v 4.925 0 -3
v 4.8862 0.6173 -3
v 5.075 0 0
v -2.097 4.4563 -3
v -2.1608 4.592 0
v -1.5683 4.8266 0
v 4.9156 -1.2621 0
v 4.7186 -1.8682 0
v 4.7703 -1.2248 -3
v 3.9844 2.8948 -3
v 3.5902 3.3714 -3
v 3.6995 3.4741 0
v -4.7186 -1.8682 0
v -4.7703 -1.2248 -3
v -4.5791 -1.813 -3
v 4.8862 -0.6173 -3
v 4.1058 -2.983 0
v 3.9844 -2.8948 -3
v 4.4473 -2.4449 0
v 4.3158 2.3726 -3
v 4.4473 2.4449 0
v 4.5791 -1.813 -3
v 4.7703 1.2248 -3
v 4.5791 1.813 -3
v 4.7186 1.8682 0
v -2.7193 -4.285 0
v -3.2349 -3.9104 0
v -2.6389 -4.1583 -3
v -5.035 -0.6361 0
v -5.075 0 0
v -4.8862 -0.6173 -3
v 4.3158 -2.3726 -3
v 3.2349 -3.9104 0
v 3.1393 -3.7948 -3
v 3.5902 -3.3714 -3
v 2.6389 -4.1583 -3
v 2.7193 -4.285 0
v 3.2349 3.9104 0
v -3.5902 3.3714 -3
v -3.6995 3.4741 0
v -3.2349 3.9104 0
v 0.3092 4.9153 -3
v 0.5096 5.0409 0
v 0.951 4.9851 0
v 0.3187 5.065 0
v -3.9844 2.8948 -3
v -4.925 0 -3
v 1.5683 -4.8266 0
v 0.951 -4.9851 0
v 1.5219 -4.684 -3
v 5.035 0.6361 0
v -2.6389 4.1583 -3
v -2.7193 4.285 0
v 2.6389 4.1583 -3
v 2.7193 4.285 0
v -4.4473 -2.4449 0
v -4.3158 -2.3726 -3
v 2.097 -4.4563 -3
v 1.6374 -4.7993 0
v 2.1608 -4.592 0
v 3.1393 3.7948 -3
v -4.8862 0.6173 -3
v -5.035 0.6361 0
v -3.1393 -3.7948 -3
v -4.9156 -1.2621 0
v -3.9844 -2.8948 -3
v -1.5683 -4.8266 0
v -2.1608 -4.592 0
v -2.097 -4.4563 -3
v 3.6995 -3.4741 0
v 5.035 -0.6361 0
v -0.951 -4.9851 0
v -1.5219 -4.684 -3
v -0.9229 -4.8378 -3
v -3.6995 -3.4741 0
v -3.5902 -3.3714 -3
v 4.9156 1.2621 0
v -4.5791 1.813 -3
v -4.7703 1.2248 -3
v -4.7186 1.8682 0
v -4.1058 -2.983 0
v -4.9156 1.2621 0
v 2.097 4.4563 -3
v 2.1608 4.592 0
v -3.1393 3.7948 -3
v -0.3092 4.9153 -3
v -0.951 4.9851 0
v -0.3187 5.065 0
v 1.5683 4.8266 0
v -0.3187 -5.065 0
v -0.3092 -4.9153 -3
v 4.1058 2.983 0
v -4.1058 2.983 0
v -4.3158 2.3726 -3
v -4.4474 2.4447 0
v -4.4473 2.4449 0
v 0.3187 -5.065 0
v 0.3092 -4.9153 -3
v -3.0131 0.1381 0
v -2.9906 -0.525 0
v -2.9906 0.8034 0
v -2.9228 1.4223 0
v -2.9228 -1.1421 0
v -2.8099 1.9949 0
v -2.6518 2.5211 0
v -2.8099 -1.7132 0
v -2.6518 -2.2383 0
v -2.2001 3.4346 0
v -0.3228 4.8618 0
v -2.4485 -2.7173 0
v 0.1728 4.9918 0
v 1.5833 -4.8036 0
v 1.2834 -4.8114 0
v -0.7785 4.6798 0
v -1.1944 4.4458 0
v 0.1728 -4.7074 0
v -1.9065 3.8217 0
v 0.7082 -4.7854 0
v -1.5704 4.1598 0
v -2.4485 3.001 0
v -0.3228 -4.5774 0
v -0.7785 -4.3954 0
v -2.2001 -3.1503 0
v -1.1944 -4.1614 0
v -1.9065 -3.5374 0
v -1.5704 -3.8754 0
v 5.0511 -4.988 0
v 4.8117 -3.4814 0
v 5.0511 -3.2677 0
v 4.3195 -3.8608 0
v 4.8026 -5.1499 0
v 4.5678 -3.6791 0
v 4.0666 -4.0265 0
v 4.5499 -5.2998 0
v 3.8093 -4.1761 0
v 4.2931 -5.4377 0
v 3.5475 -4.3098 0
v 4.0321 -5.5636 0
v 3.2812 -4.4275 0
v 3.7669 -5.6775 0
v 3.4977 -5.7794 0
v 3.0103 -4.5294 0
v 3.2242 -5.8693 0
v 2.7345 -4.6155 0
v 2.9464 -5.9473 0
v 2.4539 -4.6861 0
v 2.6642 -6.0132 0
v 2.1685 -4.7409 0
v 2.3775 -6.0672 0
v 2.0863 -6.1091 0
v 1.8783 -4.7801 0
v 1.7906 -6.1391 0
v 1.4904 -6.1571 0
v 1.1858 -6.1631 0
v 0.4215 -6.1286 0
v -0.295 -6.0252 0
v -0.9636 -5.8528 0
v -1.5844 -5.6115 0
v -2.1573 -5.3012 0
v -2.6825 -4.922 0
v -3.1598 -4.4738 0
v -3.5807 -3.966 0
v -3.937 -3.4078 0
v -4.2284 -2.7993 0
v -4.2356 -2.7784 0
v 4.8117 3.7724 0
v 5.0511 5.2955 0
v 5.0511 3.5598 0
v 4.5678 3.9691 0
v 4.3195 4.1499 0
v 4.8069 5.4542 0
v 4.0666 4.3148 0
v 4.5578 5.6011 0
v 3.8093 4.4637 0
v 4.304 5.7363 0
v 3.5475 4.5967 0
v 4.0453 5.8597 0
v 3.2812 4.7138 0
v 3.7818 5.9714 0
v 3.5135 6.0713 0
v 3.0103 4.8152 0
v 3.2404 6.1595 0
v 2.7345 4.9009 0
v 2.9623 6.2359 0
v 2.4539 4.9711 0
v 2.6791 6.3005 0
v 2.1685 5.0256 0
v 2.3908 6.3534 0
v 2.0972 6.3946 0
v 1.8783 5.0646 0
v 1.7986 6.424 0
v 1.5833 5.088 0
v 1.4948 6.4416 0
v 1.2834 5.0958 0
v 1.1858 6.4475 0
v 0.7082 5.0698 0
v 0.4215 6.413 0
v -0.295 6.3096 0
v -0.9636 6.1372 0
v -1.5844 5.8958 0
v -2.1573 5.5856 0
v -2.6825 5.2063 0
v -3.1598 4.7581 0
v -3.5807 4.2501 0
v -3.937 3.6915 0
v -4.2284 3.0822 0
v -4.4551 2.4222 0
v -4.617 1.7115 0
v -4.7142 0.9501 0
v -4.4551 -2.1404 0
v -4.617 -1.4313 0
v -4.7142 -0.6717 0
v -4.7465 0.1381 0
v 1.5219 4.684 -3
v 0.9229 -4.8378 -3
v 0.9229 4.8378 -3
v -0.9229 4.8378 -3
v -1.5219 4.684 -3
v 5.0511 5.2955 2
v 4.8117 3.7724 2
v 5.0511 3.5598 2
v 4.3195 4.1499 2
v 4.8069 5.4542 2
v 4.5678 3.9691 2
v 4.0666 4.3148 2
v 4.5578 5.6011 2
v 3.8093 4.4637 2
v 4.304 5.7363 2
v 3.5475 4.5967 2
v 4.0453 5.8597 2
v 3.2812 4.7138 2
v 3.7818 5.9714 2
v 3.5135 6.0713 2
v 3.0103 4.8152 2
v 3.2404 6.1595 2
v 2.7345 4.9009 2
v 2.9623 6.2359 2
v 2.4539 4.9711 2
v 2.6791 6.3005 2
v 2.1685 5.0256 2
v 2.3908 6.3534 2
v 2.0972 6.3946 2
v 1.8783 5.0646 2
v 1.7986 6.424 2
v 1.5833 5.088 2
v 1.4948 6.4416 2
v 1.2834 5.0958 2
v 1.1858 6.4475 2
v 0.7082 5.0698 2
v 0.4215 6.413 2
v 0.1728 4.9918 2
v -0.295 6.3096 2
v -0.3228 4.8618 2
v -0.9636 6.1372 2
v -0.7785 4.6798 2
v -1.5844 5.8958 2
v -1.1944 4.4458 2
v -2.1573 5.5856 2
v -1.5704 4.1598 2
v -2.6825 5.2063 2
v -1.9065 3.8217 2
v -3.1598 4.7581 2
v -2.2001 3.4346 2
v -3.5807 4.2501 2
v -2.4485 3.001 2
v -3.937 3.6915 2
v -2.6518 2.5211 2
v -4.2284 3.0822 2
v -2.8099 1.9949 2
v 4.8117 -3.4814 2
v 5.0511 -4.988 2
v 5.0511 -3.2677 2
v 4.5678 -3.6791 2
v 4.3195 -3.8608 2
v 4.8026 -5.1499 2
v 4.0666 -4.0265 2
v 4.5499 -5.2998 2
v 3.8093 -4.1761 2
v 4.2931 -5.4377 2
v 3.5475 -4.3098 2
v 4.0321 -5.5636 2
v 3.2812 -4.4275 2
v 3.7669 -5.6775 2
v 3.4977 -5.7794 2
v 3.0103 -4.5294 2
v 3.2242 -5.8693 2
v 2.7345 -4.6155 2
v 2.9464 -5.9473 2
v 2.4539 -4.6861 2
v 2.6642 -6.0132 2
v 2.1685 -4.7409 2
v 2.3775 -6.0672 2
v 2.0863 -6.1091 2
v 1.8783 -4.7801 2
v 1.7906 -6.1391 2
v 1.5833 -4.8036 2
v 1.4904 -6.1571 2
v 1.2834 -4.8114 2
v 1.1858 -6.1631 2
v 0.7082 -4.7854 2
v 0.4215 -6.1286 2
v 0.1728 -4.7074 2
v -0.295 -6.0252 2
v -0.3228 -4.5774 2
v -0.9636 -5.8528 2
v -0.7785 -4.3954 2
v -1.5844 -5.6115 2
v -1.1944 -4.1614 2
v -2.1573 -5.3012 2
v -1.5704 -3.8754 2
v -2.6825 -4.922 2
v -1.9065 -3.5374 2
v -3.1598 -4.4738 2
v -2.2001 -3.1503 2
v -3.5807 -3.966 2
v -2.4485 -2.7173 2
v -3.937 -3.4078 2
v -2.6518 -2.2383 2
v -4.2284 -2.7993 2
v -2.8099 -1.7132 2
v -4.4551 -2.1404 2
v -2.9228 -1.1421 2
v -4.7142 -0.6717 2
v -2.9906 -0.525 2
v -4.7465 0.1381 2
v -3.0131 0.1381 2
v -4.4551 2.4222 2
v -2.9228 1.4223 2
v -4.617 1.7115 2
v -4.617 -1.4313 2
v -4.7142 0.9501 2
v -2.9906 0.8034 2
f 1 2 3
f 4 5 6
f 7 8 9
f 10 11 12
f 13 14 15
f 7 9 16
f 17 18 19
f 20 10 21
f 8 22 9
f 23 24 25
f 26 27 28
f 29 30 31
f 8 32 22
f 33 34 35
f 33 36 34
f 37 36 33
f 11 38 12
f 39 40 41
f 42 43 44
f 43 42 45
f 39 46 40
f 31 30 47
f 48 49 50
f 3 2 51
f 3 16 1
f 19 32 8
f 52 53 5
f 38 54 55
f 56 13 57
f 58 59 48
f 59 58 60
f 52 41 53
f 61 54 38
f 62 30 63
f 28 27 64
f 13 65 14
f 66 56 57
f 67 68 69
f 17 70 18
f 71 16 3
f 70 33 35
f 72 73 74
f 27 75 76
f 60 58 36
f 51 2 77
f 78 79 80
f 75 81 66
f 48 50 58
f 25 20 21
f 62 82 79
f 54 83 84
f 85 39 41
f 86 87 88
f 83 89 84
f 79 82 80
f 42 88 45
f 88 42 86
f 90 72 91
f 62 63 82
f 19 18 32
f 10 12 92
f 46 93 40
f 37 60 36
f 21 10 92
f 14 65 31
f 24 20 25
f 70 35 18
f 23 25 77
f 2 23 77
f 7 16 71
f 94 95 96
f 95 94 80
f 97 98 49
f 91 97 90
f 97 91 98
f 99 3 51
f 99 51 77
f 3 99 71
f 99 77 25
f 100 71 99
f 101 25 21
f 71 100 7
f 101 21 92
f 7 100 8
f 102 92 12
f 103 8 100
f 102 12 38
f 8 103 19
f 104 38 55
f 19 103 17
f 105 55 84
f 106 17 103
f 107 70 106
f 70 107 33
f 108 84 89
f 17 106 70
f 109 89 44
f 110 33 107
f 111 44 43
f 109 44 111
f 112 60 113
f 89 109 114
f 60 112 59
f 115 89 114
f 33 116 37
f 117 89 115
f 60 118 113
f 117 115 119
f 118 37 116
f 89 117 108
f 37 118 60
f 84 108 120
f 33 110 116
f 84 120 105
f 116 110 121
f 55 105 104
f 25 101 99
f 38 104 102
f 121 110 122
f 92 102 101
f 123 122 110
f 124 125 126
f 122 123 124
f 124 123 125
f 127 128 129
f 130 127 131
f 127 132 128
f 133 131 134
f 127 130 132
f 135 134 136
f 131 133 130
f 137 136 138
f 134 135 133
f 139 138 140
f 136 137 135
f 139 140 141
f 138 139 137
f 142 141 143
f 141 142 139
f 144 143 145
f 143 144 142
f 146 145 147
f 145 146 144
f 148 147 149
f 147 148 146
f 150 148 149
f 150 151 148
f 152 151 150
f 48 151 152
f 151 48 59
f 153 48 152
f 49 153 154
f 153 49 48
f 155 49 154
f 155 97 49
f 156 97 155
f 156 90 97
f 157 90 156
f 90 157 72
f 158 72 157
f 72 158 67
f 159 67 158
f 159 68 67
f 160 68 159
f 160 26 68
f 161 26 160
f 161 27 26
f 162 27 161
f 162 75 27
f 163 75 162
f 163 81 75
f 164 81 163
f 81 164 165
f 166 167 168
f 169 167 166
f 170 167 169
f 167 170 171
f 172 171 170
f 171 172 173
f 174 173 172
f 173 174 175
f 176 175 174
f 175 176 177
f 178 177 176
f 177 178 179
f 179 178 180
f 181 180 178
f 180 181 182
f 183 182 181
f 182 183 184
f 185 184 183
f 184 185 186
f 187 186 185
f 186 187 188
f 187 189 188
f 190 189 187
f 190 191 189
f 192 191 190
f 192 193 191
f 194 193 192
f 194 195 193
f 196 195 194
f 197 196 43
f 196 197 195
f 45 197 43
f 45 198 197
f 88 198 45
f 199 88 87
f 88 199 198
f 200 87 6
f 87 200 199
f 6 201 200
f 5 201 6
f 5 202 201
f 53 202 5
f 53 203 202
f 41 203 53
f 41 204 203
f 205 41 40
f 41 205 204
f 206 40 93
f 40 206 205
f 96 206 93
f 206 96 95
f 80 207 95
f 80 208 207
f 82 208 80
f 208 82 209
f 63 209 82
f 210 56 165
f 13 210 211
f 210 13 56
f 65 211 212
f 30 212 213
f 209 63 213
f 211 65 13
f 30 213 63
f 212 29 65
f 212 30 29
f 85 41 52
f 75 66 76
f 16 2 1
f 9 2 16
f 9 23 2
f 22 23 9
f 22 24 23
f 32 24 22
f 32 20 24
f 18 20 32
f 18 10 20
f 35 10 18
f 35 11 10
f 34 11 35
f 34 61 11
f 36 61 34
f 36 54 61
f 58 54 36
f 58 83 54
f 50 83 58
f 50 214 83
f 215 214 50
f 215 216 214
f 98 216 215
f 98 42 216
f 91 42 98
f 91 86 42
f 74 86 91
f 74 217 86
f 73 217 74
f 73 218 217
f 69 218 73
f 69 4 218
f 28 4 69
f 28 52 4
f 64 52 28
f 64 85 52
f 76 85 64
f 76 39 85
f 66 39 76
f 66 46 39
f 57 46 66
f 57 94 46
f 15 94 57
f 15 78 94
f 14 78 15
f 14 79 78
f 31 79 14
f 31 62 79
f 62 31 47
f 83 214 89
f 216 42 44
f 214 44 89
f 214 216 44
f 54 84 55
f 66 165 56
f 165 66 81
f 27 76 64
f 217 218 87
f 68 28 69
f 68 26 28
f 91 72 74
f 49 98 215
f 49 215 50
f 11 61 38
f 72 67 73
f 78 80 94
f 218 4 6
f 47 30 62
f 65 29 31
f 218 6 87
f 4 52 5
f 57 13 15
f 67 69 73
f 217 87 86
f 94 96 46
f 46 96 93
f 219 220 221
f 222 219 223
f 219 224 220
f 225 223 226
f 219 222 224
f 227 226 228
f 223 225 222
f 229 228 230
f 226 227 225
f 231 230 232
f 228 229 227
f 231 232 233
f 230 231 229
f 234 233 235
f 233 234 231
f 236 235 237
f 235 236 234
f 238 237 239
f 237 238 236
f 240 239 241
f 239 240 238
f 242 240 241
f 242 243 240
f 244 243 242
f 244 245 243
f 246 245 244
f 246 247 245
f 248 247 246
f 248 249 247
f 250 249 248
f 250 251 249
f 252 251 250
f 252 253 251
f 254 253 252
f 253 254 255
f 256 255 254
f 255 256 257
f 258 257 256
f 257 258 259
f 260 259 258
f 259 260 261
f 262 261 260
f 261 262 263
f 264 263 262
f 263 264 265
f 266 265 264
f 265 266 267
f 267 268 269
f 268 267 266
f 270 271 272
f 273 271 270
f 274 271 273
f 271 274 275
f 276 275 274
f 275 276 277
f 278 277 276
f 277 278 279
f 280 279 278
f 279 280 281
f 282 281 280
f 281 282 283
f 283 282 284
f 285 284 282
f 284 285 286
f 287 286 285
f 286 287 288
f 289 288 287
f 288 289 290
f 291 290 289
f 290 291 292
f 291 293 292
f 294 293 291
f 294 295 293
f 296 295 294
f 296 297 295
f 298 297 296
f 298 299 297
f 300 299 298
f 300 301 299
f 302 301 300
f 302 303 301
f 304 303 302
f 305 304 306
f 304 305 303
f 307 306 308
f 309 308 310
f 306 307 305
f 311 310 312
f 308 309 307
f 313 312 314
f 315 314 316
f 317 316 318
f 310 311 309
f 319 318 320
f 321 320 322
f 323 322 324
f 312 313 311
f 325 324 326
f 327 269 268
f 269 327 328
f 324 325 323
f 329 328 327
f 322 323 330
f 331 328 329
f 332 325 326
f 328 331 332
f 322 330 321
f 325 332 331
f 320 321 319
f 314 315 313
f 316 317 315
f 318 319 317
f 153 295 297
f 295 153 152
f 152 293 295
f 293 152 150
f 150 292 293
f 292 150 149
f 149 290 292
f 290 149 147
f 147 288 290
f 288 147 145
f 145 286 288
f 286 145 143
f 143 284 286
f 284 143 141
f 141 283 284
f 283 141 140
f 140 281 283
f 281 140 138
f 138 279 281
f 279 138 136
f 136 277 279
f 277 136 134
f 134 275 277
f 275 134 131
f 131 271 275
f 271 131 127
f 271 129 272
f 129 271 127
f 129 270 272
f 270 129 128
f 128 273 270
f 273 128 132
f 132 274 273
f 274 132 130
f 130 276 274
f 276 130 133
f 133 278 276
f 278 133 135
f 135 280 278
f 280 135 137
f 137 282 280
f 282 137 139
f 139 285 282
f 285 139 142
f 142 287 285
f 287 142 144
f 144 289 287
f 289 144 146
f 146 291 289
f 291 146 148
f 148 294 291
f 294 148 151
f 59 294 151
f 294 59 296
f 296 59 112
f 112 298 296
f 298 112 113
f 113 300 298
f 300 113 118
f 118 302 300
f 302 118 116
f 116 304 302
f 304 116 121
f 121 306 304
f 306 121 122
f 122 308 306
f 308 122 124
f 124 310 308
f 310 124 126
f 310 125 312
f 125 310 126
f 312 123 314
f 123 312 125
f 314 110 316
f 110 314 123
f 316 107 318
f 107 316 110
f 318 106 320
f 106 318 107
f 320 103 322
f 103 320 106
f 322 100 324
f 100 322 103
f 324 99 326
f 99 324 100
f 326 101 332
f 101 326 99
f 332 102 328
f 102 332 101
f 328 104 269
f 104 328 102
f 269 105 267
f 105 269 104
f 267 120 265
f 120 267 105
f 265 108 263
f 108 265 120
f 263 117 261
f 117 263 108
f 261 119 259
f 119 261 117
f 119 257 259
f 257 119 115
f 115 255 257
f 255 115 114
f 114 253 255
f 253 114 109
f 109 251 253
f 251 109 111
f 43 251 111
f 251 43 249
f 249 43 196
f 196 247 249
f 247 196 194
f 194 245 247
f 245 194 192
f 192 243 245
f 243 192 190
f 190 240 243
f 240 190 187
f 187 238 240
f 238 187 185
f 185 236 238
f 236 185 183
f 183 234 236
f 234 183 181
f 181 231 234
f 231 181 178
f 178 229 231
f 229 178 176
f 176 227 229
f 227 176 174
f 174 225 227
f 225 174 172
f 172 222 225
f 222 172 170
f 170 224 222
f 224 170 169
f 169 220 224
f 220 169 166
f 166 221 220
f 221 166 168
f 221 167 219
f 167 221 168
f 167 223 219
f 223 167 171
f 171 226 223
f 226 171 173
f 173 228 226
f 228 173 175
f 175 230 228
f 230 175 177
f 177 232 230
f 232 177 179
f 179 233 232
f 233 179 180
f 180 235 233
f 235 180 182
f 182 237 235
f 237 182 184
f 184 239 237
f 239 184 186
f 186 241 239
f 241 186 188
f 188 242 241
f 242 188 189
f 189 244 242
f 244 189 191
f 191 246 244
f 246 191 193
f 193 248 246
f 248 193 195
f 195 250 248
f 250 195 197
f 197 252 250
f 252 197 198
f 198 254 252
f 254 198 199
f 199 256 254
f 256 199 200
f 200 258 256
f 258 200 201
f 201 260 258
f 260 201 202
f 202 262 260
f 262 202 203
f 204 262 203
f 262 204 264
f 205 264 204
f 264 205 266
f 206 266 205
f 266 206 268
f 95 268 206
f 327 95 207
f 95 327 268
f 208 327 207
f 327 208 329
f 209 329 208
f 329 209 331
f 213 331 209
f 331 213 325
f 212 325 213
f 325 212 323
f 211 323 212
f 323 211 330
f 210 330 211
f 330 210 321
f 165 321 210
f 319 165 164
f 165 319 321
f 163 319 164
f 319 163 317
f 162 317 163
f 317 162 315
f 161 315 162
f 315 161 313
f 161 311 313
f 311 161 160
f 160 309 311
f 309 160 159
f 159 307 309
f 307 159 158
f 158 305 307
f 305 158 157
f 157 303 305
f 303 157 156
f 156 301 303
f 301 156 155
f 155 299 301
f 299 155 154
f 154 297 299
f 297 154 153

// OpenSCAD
$fn = 50;

difference() {
	union() {
		translate(v = [0, 0, -3.0]) {
			cylinder(h = 3, r1 = 4.925, r2 = 5.075);
		}
		linear_extrude(height = 2) {
			text(font = "Impact", halign = "center", size = 12, text = "C", valign = "center");
		}
	}
	union();
}
